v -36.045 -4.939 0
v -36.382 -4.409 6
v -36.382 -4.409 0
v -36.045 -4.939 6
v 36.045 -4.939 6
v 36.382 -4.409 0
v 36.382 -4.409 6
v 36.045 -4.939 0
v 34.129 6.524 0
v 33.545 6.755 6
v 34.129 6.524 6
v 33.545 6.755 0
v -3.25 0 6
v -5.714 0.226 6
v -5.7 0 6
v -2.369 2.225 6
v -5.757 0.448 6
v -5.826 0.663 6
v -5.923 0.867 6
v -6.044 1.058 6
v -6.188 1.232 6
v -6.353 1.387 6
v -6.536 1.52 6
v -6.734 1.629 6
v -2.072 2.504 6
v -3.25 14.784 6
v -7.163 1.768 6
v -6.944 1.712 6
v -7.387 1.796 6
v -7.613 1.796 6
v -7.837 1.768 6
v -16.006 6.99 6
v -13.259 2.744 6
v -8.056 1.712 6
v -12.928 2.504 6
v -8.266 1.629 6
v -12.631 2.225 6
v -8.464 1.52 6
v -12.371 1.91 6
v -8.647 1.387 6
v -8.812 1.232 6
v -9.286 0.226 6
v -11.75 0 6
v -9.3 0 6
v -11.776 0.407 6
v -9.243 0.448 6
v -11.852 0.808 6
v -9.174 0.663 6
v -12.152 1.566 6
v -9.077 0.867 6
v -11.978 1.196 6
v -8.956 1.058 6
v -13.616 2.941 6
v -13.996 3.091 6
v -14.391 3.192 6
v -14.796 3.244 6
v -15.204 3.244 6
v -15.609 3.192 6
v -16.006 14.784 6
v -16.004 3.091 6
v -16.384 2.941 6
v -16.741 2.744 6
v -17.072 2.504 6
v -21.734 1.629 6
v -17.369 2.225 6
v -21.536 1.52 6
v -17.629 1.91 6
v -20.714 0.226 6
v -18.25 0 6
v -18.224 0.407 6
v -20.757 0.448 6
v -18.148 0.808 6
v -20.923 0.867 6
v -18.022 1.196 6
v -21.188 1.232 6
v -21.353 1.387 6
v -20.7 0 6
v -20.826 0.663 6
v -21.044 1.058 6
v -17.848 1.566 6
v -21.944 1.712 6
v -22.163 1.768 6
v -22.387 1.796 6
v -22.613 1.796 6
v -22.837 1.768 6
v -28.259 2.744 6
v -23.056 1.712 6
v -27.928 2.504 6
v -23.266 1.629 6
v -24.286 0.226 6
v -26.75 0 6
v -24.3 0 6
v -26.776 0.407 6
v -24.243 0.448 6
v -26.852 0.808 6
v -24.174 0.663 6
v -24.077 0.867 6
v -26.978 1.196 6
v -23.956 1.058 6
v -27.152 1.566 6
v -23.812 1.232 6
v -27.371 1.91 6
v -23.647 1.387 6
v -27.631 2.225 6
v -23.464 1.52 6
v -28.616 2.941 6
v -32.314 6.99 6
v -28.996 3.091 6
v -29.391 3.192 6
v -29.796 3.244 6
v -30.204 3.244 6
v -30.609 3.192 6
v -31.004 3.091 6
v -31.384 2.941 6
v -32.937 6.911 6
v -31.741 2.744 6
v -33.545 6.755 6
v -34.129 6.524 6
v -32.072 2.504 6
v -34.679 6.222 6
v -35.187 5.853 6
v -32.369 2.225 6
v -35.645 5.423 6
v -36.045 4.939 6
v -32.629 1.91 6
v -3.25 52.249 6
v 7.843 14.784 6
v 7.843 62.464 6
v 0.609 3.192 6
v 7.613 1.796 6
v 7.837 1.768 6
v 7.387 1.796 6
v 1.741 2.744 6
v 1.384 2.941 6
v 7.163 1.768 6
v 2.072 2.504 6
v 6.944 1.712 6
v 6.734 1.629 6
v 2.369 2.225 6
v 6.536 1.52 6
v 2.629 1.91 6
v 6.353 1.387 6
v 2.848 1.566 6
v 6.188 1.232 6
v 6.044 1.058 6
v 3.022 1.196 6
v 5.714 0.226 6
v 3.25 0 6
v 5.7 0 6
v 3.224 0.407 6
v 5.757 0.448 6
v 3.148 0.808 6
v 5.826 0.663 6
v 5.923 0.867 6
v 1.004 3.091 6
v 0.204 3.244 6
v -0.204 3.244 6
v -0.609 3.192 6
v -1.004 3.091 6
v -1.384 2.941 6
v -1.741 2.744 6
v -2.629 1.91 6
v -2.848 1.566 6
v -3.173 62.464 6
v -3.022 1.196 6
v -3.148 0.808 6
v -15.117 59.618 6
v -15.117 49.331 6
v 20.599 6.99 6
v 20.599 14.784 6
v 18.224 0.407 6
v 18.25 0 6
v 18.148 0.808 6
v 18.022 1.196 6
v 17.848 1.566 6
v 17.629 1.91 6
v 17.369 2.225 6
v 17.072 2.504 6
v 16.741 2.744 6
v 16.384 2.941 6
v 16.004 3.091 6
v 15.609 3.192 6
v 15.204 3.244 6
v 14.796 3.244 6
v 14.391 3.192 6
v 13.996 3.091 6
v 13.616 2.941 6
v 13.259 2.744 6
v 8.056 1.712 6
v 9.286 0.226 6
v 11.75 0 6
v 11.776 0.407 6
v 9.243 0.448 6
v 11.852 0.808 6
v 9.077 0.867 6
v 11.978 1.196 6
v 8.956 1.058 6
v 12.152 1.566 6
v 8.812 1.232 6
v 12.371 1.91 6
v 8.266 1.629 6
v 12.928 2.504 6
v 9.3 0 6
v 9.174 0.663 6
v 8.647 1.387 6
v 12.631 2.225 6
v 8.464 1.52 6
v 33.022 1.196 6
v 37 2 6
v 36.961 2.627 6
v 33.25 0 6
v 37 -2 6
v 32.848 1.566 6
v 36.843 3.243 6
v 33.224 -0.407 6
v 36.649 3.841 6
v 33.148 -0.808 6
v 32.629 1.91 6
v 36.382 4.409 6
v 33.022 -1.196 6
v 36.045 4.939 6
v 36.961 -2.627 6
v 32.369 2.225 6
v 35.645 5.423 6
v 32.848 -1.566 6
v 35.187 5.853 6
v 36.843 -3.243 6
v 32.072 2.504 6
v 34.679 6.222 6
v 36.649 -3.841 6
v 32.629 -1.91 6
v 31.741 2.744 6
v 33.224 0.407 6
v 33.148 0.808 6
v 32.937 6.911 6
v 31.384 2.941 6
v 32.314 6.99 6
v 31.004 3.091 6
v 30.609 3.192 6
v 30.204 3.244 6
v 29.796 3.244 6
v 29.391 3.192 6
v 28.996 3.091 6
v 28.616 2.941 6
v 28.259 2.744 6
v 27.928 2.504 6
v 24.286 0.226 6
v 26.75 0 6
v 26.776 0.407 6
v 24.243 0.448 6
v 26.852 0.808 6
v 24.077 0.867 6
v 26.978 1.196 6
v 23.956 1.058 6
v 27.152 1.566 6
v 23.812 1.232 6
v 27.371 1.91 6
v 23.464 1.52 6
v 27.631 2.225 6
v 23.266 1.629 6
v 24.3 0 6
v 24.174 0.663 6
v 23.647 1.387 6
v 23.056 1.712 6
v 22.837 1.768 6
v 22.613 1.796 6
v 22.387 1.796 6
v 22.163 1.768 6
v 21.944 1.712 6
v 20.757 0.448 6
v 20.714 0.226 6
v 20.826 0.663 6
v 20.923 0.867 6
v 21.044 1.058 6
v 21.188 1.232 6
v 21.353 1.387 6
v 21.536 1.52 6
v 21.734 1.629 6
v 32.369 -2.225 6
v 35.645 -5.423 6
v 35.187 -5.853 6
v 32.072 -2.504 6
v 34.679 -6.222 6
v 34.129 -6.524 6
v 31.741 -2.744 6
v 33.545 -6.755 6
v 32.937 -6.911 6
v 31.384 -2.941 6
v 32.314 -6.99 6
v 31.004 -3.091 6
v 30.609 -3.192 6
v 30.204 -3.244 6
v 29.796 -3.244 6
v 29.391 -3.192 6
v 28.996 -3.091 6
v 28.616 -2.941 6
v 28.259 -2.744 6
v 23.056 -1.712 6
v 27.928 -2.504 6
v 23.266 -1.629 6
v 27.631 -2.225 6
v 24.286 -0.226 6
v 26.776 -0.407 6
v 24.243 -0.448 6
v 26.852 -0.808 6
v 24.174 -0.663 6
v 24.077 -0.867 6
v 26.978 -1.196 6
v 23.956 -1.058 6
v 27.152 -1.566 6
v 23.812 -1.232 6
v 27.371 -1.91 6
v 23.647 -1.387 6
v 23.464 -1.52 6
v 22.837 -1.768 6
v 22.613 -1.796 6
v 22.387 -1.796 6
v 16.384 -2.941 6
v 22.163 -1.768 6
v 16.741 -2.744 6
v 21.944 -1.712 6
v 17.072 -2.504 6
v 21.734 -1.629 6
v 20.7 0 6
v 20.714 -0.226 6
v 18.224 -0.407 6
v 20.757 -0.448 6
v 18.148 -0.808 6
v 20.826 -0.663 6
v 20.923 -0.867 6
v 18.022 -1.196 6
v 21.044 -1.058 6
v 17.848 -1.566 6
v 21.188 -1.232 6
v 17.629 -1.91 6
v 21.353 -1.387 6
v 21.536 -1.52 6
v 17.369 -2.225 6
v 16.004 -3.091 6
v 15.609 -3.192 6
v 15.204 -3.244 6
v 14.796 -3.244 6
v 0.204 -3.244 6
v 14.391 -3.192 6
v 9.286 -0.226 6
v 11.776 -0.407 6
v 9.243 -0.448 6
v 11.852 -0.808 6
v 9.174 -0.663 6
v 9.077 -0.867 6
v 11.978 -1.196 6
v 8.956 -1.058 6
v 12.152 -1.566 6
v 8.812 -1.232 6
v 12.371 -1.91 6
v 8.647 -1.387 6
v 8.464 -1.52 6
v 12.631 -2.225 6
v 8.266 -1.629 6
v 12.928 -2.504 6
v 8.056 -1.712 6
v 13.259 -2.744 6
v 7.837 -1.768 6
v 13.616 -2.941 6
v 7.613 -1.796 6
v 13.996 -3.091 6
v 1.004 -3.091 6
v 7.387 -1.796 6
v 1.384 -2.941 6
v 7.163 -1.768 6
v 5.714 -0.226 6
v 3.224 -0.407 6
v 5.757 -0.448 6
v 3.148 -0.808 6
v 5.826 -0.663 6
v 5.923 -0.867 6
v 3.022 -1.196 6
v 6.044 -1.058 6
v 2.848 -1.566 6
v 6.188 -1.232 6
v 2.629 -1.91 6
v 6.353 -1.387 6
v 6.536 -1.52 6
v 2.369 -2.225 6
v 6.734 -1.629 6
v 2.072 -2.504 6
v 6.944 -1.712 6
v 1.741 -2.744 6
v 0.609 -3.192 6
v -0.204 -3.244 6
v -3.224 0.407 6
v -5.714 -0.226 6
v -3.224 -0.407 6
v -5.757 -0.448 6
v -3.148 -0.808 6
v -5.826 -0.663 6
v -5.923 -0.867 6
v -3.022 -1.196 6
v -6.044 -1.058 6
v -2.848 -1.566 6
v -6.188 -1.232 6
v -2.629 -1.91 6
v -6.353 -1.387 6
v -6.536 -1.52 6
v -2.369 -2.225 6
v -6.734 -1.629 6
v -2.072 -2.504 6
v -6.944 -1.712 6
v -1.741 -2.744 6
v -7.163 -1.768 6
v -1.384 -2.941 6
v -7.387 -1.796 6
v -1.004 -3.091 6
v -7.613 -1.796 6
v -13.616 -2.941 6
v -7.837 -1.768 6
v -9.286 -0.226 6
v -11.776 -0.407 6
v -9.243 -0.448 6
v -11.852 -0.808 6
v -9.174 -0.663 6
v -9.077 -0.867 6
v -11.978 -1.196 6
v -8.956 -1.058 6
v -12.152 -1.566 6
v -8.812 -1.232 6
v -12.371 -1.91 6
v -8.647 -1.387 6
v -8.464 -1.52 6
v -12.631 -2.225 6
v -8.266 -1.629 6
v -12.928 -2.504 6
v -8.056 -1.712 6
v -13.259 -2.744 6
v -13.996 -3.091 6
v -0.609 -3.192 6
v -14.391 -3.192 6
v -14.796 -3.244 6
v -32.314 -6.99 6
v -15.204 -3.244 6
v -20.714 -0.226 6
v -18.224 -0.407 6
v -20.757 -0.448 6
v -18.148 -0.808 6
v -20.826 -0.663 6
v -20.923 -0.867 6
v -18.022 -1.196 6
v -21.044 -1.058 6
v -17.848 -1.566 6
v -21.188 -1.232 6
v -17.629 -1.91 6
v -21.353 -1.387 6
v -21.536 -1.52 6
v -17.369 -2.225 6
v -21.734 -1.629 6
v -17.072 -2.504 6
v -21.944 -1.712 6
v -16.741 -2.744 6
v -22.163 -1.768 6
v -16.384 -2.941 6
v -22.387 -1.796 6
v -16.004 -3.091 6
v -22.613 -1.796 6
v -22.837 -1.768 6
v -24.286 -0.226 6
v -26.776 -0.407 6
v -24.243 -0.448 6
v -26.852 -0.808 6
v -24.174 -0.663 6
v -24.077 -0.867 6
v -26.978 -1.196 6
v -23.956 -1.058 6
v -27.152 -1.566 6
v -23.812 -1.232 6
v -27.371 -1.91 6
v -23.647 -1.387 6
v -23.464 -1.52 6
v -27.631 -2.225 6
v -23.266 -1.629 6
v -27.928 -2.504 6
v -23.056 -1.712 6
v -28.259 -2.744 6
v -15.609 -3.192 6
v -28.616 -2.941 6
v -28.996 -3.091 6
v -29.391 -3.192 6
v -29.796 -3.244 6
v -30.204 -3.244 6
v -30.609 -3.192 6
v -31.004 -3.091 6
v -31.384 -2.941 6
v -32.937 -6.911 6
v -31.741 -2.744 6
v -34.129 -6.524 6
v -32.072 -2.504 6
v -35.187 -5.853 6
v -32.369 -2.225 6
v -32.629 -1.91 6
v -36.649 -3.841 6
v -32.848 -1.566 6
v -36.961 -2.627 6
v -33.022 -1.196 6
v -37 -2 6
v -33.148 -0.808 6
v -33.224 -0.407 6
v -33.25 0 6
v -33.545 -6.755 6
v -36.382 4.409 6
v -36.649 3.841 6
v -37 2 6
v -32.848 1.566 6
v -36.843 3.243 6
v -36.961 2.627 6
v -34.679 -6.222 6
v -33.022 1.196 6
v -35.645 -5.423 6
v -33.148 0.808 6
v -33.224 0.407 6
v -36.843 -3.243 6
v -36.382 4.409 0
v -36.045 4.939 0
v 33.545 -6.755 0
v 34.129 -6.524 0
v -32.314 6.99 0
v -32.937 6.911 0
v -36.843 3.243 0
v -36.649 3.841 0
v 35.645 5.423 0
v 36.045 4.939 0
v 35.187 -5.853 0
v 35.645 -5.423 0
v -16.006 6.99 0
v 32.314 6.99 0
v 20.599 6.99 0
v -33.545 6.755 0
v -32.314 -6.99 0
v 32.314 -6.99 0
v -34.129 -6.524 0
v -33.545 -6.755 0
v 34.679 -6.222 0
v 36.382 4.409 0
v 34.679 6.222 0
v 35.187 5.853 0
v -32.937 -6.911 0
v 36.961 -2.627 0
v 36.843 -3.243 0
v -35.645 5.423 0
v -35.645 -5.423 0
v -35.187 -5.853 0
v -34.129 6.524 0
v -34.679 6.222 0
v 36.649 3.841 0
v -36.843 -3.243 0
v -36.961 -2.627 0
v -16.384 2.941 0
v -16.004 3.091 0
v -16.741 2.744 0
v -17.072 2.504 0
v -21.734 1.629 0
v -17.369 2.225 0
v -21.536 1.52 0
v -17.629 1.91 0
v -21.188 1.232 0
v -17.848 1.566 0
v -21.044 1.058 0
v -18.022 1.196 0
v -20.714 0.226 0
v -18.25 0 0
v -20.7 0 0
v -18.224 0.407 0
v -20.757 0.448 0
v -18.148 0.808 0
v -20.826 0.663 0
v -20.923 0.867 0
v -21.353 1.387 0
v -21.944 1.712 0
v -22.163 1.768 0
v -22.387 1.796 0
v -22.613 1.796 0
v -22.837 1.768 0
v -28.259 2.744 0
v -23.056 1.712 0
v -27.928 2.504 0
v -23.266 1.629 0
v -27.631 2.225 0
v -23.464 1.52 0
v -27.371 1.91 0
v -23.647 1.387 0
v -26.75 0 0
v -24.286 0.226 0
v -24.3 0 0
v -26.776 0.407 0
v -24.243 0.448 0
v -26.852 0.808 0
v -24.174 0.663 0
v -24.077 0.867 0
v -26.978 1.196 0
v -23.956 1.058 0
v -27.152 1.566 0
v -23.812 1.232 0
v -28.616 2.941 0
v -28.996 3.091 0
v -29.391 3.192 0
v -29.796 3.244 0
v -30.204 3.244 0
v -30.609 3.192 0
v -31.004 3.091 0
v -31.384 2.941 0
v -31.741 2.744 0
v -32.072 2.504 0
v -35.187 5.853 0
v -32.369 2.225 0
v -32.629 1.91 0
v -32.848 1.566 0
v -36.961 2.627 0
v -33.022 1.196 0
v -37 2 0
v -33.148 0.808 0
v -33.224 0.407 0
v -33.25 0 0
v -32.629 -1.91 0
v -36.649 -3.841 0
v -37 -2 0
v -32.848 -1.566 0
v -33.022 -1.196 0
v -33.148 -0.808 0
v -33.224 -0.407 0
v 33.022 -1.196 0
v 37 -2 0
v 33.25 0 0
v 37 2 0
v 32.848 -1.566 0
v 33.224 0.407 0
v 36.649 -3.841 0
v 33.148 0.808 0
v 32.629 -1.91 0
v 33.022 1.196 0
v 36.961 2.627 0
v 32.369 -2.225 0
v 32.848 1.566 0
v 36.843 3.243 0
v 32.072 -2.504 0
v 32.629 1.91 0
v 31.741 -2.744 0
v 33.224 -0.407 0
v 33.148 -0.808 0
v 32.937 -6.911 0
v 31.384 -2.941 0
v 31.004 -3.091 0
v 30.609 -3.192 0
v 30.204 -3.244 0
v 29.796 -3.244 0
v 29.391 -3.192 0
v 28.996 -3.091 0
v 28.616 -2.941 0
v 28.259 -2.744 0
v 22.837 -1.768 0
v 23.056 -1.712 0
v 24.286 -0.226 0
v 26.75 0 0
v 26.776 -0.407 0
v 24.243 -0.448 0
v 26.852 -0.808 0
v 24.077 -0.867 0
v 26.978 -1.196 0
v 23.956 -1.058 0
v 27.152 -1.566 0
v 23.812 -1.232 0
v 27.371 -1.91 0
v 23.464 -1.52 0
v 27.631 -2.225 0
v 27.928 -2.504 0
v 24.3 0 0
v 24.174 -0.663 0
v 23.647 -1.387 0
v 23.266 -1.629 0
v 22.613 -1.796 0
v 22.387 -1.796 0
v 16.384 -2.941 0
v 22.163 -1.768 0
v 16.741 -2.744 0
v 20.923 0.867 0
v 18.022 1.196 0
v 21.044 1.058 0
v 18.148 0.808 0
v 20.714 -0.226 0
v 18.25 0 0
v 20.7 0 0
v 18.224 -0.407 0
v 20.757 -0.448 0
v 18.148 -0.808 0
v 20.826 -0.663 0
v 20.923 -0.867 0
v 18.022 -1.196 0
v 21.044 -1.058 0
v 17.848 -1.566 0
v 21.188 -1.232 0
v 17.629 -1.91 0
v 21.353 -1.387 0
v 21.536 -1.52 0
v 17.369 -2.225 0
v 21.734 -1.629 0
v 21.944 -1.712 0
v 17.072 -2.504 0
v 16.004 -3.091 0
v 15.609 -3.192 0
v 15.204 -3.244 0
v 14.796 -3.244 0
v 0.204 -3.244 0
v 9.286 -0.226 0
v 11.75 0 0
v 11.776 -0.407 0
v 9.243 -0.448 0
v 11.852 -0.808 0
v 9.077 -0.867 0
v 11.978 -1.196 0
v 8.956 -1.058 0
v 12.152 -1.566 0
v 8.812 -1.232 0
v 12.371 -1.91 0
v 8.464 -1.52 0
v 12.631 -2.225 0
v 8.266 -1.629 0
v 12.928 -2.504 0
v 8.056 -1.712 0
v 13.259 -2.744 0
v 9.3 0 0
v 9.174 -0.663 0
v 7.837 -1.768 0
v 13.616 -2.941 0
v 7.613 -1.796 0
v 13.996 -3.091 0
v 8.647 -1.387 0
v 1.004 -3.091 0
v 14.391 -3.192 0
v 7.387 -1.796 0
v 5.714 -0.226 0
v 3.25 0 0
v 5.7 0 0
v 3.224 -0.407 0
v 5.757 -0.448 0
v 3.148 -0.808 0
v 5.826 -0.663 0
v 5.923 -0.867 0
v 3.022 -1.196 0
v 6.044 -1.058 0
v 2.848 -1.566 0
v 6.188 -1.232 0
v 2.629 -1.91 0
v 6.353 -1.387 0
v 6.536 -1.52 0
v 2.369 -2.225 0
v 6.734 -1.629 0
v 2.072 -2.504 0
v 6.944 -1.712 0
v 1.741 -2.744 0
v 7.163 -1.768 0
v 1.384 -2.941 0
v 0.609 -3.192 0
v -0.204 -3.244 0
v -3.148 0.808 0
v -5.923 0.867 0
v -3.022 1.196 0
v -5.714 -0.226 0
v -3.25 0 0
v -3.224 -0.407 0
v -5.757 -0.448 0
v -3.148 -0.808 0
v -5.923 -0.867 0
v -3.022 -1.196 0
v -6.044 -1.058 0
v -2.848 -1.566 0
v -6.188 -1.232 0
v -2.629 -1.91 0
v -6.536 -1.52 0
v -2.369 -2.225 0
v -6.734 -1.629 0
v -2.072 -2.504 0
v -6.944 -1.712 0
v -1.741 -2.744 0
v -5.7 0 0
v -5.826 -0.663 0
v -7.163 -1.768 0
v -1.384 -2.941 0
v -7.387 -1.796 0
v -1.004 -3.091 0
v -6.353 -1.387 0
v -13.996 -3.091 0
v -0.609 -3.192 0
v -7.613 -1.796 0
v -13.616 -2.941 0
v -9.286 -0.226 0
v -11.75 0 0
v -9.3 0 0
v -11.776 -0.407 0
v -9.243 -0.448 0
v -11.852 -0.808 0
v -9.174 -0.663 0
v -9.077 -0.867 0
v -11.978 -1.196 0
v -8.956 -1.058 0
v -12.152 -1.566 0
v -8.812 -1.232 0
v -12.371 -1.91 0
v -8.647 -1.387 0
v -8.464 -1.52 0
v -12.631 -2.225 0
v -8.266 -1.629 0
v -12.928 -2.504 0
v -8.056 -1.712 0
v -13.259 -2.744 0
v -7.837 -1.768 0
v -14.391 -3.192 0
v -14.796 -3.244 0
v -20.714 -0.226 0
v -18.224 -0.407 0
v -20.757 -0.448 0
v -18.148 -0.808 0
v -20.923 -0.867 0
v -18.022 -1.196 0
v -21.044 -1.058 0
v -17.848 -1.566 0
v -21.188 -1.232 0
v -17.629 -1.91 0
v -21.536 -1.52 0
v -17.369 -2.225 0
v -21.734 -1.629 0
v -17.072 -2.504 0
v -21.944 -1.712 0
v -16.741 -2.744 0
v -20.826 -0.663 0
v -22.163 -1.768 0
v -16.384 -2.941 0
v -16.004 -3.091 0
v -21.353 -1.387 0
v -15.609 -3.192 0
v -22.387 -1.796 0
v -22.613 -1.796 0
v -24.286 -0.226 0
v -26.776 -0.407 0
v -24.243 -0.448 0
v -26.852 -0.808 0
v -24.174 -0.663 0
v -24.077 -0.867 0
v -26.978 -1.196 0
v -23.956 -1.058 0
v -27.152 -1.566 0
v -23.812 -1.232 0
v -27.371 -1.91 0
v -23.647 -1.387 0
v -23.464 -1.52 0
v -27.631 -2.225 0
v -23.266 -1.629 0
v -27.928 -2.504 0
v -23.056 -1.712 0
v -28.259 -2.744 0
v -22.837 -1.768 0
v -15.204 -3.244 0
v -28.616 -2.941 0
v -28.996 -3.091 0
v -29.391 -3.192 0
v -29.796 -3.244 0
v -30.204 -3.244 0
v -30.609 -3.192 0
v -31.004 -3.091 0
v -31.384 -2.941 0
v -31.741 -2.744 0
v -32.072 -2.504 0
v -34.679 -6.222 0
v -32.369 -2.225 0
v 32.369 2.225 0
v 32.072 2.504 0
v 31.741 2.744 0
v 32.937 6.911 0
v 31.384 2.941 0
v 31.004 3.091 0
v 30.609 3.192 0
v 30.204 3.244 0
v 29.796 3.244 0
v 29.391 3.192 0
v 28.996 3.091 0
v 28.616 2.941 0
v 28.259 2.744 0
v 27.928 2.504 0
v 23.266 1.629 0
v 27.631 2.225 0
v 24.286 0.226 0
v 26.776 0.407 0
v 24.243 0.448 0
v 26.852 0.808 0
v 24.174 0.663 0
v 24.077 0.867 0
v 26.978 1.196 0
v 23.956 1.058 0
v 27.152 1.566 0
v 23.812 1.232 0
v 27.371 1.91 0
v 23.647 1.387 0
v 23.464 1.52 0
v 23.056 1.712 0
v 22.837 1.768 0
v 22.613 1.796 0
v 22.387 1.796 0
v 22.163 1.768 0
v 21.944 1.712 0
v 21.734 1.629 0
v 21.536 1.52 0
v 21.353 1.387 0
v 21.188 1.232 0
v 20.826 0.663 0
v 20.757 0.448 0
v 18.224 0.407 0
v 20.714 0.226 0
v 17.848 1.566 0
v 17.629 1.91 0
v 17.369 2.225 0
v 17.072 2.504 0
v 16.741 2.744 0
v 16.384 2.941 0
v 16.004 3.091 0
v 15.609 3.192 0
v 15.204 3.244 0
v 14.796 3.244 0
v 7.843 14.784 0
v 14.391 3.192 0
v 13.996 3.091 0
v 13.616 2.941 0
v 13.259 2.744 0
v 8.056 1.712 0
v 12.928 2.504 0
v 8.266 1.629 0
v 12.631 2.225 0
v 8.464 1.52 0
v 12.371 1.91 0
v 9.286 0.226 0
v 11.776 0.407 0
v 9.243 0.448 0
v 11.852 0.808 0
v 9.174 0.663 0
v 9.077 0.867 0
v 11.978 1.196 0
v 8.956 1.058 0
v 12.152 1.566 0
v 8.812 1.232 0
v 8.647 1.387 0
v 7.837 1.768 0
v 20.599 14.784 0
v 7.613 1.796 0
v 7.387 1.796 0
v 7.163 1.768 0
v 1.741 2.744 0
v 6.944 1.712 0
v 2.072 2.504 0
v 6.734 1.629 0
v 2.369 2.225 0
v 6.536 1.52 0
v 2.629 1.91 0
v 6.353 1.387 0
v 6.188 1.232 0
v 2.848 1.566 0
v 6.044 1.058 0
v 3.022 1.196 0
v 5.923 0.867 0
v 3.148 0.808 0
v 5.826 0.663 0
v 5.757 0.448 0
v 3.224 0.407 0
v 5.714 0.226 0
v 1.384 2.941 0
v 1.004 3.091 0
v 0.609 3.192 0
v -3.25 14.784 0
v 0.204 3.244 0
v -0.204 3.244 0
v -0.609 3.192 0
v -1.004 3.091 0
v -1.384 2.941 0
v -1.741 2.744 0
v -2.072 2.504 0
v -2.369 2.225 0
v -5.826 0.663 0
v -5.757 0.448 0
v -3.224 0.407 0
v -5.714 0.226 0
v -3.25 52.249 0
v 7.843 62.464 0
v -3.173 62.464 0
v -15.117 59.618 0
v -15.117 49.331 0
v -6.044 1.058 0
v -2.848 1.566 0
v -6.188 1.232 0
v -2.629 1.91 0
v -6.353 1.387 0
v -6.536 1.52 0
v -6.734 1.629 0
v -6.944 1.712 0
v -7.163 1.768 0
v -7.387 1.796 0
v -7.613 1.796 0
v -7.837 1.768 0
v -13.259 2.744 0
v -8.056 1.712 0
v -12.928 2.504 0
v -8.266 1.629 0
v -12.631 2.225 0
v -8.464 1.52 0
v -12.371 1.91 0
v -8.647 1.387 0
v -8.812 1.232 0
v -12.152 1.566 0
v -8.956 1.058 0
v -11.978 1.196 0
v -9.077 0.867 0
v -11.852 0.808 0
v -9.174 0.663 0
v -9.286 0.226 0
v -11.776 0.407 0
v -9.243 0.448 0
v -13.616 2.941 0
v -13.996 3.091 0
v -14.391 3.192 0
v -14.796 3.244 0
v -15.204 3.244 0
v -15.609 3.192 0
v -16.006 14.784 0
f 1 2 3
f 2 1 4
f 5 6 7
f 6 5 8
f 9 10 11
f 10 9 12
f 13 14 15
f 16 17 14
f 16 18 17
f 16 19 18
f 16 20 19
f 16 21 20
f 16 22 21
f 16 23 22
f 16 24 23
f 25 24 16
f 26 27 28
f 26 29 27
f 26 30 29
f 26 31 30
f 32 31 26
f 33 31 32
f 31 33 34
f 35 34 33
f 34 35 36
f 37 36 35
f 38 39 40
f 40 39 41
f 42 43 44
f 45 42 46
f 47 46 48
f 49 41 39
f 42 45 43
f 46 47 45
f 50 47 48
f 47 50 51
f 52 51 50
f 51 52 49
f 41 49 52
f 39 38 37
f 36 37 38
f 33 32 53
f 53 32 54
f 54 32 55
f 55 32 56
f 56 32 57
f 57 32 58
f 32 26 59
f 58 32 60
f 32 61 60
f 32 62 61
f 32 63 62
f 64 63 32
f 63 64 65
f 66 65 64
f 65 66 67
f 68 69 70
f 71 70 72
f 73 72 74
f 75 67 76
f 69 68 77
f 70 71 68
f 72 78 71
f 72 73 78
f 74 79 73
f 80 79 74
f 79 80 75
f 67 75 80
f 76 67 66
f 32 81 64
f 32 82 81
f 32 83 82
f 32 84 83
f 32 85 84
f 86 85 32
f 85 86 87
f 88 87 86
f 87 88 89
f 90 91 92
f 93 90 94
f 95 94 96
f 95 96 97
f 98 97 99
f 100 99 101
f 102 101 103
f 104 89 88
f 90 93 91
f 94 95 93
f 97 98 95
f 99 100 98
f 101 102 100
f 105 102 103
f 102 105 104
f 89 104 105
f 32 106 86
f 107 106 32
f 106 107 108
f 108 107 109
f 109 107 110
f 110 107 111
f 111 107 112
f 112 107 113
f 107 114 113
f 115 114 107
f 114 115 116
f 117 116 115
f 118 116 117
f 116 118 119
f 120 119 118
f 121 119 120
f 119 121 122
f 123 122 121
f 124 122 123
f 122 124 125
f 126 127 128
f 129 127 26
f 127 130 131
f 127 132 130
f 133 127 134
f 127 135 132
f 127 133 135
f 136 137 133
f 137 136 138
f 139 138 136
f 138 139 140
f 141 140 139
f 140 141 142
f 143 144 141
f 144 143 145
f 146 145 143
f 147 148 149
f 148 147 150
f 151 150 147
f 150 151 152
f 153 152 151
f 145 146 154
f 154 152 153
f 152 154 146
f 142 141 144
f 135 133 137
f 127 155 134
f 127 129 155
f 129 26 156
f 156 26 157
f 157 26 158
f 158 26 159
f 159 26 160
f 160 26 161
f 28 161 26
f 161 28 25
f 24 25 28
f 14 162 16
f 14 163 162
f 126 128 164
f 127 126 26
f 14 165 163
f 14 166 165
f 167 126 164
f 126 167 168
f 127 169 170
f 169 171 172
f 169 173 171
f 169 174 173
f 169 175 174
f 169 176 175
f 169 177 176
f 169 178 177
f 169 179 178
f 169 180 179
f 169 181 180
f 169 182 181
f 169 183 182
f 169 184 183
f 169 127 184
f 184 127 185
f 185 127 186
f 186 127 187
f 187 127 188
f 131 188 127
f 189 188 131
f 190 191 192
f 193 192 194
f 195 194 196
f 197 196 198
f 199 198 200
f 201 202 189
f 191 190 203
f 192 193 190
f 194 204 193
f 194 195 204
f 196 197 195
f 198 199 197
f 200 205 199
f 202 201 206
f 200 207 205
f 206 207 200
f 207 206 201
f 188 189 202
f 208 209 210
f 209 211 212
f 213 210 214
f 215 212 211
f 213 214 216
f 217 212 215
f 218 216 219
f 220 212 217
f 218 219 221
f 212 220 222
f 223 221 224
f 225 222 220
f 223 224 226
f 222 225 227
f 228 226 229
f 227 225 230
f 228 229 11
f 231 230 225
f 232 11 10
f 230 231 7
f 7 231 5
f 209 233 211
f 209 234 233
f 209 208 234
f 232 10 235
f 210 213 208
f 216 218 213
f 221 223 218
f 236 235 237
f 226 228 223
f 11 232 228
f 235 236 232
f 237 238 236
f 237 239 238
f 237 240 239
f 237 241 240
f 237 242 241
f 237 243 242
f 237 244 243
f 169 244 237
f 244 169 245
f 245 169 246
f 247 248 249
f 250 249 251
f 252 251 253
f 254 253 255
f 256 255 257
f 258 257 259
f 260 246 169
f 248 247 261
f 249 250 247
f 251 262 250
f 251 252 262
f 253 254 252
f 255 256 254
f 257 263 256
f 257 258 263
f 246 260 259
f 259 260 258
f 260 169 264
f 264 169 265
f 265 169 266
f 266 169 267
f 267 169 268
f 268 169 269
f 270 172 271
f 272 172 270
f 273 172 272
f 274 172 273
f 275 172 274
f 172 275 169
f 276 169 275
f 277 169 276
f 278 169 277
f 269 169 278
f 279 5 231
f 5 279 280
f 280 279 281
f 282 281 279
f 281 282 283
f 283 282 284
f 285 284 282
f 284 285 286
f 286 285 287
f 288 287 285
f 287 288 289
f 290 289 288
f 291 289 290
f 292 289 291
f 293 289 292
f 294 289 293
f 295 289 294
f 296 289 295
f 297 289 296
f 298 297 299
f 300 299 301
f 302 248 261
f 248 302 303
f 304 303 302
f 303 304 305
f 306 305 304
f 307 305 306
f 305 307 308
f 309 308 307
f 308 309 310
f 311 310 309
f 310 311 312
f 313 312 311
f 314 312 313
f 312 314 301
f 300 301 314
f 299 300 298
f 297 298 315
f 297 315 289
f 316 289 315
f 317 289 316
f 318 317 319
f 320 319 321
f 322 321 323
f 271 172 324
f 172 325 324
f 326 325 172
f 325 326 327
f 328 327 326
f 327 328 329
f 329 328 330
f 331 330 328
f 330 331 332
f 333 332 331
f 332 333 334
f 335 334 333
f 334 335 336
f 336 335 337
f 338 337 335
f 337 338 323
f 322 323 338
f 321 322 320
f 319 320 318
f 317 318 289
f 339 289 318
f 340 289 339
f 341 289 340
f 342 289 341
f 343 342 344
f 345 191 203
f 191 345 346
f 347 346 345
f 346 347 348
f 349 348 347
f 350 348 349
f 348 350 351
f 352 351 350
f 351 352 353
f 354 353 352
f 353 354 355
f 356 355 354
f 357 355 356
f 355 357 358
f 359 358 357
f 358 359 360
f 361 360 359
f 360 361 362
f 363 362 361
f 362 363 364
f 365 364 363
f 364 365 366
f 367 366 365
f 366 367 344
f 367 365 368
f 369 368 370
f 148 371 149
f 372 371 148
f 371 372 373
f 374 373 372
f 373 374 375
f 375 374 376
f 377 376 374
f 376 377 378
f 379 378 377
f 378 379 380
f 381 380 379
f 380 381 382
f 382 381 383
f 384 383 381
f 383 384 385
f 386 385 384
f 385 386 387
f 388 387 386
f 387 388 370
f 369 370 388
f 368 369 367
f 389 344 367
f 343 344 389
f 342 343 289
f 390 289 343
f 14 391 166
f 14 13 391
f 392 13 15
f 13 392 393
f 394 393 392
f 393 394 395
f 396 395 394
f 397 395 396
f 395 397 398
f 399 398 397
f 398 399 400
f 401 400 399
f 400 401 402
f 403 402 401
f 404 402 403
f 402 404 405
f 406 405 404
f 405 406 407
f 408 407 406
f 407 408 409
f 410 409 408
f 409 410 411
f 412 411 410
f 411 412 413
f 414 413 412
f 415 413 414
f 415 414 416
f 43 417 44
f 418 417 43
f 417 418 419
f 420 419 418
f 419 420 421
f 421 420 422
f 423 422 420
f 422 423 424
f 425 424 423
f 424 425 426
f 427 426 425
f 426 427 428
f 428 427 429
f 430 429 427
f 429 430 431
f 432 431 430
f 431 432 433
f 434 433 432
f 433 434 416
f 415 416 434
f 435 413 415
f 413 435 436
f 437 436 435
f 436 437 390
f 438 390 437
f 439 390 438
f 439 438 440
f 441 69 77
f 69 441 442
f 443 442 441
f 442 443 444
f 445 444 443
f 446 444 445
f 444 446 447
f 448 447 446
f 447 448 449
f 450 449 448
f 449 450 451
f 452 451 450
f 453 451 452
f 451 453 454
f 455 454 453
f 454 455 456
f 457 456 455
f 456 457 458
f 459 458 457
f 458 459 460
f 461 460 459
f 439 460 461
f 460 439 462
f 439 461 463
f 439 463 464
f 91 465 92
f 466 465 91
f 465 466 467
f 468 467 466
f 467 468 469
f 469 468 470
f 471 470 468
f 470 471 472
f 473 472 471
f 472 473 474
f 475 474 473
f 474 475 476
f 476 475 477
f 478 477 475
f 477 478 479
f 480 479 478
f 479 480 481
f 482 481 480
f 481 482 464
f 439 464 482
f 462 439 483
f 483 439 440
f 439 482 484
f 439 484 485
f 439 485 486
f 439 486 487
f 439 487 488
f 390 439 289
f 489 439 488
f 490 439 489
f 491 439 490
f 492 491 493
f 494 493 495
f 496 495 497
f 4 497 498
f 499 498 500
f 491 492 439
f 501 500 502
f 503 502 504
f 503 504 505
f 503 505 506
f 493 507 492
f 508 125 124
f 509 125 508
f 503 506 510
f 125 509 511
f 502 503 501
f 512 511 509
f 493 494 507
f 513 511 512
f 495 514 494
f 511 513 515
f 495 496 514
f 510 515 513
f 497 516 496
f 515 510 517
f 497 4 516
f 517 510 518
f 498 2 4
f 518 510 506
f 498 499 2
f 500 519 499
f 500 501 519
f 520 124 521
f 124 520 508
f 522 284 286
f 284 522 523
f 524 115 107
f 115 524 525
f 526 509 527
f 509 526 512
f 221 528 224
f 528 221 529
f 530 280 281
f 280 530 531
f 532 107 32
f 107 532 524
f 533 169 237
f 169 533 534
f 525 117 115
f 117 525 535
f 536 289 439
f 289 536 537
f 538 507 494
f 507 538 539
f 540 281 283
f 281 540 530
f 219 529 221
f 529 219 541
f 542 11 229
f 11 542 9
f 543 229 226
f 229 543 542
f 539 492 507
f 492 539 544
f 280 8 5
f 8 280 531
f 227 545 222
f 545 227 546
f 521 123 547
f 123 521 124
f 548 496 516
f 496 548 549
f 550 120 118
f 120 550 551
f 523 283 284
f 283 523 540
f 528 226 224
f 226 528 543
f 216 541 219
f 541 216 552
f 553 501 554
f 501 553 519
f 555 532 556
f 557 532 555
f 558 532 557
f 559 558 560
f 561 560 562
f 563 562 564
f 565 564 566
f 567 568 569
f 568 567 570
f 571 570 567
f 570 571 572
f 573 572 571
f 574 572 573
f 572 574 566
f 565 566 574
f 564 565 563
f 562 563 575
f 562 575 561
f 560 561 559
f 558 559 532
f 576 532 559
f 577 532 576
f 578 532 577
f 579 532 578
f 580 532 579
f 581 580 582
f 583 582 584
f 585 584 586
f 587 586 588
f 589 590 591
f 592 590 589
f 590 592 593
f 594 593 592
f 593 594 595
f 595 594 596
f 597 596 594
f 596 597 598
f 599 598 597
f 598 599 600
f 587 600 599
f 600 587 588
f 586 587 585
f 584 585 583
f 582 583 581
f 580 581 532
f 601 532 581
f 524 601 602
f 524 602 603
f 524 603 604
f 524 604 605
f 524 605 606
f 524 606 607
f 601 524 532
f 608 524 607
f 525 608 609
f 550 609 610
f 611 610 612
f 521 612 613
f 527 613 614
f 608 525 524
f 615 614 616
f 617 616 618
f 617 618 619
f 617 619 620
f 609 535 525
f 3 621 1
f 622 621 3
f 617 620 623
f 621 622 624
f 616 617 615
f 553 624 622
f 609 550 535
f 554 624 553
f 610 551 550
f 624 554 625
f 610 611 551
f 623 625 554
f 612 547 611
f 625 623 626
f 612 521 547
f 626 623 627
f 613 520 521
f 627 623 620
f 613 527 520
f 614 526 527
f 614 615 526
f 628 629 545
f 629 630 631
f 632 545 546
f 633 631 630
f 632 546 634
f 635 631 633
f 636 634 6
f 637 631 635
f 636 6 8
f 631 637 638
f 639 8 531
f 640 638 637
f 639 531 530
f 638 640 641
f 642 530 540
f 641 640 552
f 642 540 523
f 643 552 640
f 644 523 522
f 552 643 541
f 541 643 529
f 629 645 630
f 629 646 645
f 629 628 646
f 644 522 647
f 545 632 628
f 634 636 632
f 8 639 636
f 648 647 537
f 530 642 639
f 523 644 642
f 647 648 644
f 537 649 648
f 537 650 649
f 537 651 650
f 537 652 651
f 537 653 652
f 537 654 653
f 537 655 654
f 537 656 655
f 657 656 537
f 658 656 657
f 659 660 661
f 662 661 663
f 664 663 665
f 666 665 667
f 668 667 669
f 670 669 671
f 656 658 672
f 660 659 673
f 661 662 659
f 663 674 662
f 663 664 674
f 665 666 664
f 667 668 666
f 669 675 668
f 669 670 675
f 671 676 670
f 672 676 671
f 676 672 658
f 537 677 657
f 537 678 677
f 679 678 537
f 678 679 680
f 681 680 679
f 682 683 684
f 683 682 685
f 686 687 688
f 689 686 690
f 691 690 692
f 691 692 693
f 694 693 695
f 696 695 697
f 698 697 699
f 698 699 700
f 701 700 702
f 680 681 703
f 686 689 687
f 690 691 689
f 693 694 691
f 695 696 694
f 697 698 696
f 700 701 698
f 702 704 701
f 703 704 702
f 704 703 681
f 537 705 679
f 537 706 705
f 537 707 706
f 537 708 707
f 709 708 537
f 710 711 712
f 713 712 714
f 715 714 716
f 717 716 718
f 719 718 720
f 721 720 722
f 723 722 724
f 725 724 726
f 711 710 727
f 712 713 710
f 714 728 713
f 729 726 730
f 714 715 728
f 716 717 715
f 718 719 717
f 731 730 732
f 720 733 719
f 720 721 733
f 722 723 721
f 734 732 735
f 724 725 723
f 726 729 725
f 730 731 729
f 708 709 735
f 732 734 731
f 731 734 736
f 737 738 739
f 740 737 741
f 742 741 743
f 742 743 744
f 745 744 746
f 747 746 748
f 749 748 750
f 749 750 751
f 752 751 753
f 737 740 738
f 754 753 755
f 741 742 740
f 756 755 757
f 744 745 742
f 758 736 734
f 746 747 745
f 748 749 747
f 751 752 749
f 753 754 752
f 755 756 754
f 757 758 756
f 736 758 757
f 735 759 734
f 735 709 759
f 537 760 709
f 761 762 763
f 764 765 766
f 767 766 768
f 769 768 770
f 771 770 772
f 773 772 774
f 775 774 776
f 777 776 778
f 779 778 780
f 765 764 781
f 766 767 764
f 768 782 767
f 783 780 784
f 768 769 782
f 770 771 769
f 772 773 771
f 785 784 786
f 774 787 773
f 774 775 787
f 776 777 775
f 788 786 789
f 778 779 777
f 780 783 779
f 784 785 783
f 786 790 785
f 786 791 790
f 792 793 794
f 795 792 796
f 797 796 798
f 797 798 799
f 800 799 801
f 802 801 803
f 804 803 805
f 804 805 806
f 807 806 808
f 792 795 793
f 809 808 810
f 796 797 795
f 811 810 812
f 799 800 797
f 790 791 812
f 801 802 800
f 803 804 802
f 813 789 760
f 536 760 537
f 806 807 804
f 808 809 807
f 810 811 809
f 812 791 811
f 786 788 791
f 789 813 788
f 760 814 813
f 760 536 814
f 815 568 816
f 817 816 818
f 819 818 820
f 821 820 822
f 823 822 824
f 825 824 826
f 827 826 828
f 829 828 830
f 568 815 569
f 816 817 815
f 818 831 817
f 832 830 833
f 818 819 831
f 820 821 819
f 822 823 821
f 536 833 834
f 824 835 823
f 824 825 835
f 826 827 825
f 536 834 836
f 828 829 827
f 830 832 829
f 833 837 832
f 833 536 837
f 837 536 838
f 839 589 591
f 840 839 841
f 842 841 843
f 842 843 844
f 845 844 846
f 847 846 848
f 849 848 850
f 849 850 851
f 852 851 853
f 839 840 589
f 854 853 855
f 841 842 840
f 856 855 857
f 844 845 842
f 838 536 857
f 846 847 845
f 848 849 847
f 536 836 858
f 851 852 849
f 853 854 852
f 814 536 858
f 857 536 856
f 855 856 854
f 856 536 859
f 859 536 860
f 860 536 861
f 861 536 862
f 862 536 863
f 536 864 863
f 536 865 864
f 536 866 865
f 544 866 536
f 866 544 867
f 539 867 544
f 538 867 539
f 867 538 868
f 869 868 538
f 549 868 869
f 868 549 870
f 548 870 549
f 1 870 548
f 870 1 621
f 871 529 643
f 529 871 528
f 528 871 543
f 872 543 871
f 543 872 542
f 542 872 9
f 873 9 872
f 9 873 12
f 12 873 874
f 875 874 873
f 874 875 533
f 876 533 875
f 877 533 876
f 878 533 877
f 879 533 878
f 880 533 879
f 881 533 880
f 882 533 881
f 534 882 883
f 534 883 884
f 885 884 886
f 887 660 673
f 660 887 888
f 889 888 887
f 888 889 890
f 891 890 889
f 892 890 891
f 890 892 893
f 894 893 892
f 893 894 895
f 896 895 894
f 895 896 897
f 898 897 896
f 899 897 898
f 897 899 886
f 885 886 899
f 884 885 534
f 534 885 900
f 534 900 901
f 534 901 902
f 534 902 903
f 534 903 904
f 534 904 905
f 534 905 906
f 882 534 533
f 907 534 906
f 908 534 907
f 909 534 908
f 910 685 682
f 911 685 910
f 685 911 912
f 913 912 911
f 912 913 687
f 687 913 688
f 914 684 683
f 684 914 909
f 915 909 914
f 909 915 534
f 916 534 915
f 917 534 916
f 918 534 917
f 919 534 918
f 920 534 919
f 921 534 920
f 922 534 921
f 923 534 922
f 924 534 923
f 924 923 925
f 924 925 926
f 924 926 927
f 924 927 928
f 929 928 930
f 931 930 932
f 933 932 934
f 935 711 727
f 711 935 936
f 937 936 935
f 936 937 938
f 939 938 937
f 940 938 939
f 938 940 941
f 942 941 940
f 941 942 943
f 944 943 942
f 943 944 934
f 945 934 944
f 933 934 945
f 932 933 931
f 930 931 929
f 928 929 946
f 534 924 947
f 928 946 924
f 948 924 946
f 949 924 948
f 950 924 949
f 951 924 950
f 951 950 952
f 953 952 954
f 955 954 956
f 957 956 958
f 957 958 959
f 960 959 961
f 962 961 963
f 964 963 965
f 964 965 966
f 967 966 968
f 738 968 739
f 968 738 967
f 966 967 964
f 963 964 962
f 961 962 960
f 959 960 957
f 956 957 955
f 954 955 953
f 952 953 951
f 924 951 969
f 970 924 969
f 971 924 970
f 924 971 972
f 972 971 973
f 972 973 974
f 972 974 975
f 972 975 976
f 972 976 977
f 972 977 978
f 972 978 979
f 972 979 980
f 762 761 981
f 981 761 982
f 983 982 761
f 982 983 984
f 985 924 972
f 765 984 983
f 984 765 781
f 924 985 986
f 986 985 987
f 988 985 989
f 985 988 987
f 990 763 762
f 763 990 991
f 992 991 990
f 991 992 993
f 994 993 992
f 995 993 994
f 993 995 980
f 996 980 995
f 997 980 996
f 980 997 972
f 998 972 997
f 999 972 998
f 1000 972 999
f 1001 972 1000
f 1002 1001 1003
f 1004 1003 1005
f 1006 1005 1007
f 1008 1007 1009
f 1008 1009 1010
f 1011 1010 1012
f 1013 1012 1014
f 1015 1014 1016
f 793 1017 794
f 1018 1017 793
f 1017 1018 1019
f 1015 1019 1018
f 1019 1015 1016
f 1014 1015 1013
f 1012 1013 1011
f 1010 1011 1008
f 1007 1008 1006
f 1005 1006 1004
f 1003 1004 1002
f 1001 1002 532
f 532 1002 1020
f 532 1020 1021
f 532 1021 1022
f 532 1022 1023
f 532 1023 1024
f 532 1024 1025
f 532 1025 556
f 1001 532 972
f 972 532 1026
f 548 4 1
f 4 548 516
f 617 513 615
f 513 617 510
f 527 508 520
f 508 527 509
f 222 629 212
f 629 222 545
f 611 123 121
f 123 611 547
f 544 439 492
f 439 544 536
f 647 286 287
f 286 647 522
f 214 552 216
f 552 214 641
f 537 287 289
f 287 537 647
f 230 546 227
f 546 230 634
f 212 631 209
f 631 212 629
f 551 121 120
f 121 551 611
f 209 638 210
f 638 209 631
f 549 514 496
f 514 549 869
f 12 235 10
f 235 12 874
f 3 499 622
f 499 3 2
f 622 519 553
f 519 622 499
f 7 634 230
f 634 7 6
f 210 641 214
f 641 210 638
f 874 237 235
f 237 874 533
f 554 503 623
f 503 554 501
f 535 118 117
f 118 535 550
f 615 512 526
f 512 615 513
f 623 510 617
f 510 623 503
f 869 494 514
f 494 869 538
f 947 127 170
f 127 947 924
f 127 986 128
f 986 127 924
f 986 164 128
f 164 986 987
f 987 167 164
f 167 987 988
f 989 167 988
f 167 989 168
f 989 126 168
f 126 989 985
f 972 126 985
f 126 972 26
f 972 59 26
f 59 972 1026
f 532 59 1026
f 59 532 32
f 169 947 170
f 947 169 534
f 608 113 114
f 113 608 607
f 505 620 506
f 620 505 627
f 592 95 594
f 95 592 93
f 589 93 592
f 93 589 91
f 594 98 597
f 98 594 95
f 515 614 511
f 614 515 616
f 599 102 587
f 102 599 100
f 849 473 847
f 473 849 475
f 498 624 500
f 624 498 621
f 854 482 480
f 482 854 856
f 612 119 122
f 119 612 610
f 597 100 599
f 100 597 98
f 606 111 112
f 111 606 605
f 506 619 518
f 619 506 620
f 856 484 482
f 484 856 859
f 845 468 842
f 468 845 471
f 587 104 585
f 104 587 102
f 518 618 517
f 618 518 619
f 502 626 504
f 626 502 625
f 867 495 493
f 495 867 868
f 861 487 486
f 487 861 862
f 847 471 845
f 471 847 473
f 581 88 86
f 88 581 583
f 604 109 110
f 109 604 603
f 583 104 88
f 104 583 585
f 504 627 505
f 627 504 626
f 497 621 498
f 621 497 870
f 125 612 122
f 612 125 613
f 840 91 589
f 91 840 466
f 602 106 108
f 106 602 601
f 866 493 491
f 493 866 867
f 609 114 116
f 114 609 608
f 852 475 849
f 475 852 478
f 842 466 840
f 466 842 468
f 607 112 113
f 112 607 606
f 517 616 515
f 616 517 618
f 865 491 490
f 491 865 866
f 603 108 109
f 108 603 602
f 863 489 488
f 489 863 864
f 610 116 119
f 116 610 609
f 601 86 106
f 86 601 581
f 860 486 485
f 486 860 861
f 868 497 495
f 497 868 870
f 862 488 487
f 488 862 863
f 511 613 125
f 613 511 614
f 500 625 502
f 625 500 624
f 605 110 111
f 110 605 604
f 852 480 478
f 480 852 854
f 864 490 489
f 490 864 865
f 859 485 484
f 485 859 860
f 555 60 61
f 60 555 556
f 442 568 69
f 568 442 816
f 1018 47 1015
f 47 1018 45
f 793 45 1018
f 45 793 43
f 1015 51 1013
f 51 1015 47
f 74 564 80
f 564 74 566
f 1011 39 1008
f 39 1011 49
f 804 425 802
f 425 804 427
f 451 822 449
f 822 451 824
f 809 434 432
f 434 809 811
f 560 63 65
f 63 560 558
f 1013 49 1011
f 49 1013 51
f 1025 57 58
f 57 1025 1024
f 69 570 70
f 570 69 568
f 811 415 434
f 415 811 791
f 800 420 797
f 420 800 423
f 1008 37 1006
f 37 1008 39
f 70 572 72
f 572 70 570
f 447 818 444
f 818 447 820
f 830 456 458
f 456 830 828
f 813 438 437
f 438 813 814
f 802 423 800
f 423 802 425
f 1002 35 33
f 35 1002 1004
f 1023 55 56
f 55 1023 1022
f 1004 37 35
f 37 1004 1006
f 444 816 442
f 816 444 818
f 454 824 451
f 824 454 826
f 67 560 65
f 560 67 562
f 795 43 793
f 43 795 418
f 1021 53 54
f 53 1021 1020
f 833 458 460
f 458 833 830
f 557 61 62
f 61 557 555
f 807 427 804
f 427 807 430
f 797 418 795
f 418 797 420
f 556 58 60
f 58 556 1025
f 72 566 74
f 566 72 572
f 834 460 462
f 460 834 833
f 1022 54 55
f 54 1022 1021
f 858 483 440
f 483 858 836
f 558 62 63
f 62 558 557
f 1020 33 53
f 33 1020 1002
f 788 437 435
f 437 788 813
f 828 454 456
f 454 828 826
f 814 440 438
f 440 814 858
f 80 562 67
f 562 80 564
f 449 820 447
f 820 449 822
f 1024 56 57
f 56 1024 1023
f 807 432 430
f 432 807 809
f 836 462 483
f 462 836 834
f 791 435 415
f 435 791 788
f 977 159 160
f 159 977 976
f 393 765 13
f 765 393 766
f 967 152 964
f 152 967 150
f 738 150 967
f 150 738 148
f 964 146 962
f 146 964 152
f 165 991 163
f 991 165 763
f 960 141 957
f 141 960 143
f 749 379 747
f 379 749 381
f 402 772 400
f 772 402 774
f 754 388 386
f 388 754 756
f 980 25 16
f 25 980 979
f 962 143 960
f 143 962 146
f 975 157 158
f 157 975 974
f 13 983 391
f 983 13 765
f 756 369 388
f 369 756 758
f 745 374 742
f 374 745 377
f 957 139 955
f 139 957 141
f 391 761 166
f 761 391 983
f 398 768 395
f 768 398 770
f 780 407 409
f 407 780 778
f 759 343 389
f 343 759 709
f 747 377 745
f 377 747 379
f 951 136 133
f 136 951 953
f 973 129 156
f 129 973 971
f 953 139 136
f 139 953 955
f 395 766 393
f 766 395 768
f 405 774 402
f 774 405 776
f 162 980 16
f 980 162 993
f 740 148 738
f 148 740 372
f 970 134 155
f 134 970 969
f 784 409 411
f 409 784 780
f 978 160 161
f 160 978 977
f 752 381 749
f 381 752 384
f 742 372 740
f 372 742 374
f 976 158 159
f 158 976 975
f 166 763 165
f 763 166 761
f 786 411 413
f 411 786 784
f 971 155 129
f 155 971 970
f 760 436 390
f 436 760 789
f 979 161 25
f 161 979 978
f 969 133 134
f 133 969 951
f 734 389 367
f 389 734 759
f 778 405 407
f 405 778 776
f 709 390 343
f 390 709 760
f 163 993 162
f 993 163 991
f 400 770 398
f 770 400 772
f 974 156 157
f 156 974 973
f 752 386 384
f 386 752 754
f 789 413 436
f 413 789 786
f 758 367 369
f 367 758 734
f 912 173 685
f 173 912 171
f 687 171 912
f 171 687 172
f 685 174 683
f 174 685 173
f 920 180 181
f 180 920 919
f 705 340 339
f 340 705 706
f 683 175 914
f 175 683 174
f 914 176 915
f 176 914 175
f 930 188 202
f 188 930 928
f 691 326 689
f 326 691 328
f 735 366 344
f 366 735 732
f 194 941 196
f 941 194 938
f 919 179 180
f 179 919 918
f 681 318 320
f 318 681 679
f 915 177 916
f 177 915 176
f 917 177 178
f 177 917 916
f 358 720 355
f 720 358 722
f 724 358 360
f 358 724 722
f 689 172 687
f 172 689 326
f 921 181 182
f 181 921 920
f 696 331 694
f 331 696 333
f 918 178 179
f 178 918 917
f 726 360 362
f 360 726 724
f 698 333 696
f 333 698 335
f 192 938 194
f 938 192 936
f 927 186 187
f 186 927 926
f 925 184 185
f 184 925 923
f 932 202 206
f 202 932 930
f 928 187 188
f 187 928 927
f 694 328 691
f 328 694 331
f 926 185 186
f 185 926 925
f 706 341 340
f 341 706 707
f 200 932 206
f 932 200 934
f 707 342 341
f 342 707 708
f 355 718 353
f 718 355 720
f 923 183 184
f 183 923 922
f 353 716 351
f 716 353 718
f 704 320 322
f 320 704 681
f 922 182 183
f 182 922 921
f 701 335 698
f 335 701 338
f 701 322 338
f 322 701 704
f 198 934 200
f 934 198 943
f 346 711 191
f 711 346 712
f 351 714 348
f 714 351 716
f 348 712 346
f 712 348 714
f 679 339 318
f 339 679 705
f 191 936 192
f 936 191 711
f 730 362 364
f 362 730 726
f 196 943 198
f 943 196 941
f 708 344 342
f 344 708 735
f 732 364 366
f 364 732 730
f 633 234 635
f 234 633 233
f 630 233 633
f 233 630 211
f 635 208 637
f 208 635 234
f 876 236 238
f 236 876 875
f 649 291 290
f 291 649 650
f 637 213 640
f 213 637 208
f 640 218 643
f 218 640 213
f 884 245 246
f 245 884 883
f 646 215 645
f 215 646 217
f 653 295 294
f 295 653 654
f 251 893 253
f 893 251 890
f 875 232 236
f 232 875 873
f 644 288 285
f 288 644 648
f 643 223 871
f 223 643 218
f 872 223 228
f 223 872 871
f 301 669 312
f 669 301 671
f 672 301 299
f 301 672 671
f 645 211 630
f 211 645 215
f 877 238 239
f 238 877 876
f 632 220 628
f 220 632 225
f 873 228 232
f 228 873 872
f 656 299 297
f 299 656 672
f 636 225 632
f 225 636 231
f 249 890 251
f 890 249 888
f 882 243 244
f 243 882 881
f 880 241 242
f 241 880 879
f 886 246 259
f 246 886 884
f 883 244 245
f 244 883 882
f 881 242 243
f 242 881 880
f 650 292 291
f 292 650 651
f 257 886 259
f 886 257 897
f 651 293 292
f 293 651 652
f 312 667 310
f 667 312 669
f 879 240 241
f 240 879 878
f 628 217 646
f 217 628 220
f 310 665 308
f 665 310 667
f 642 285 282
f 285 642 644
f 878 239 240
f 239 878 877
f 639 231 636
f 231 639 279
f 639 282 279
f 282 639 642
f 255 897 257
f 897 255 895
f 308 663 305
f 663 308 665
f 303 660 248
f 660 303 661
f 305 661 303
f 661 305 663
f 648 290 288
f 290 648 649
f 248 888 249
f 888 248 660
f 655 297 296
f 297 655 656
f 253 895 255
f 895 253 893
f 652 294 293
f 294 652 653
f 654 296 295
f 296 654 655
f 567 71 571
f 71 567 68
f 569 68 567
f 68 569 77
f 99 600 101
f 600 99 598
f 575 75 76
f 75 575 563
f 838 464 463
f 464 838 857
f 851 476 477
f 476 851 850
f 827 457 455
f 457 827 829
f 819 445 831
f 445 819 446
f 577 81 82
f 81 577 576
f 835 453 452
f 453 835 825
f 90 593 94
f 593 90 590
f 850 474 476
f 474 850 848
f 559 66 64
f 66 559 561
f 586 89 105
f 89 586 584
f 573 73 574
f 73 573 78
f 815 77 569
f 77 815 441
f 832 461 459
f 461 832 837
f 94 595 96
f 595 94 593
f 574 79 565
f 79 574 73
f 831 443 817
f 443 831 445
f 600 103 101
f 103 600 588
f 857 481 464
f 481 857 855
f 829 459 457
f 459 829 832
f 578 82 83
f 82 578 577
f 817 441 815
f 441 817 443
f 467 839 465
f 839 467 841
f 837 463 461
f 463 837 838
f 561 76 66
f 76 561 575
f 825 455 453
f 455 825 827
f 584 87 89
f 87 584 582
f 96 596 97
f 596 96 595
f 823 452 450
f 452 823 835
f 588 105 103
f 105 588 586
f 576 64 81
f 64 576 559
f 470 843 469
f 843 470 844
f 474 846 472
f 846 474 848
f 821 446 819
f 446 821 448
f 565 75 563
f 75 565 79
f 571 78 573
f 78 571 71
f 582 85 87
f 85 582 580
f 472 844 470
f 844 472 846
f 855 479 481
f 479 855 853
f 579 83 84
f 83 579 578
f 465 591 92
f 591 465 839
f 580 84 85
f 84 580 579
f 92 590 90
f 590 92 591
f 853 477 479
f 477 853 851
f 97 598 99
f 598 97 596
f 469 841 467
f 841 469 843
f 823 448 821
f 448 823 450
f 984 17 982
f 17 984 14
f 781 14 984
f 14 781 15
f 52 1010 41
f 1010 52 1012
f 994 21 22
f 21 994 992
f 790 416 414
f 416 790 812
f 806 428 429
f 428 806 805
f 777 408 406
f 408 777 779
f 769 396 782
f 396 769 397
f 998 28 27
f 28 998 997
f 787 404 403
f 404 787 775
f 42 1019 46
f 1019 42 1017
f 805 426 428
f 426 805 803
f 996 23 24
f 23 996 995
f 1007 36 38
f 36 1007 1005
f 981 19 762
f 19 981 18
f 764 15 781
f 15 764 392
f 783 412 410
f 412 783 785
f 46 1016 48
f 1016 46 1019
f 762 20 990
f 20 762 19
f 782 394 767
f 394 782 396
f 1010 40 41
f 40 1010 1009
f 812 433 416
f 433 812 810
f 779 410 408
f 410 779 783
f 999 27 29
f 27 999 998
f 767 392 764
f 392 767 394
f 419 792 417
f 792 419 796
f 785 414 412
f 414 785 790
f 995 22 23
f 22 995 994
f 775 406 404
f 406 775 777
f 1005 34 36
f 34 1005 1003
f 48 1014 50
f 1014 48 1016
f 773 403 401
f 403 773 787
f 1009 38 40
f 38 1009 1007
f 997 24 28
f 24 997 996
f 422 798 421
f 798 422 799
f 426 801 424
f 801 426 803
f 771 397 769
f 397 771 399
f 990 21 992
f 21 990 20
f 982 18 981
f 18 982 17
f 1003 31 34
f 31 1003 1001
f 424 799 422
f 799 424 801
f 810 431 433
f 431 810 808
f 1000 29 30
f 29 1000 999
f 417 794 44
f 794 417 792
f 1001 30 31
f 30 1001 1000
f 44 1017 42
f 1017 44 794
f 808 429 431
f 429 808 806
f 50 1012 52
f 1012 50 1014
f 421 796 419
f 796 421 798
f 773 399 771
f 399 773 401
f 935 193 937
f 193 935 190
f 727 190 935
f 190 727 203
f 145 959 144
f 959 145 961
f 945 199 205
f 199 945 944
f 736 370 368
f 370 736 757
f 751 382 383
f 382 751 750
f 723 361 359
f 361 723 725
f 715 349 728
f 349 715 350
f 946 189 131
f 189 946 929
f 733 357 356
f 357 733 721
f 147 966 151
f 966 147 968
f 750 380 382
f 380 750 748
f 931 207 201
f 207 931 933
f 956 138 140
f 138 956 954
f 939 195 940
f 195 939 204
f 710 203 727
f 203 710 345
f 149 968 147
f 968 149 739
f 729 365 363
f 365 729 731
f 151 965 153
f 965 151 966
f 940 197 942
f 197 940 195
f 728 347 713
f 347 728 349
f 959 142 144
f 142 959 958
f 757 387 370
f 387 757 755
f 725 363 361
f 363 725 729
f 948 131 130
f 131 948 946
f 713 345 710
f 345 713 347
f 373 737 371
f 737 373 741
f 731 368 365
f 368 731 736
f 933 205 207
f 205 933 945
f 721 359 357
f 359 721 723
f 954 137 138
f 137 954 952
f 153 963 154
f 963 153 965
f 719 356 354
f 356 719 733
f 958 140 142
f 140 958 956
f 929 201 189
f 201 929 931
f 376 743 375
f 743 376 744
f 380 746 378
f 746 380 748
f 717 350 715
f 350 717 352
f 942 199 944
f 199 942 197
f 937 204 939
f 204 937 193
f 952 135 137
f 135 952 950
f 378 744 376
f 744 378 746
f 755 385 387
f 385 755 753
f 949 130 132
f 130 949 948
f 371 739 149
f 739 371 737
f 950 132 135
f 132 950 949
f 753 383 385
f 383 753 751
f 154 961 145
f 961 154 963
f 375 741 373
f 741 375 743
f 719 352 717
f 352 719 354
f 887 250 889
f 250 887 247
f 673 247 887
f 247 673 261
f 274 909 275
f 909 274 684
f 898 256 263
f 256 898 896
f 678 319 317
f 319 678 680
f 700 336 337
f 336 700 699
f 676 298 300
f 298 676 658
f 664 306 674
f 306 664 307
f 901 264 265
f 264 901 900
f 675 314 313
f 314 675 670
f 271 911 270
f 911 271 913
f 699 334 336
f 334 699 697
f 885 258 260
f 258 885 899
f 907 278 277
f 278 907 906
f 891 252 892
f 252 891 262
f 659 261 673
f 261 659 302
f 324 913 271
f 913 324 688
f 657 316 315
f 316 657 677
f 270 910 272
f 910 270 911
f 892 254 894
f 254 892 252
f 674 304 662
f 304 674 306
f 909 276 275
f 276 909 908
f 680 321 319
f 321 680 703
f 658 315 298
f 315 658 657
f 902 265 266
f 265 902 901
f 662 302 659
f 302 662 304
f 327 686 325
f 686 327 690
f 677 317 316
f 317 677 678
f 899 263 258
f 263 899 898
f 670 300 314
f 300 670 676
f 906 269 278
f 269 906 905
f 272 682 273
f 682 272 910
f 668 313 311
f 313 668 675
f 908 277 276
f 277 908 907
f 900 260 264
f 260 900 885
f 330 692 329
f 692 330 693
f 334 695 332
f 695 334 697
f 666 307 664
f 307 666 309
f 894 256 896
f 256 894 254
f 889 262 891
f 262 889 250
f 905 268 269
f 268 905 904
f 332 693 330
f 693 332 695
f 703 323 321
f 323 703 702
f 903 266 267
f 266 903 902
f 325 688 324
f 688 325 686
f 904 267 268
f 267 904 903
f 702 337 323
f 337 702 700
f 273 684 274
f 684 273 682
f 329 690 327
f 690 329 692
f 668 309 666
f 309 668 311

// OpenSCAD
$fn = 50;


difference() {
	union() {
		hull() {
			translate(v = [-32.0000000000, 2.0000000000, 0]) {
				cylinder(h = 6, r = 5);
			}
			translate(v = [32.0000000000, 2.0000000000, 0]) {
				cylinder(h = 6, r = 5);
			}
			translate(v = [-32.0000000000, -2.0000000000, 0]) {
				cylinder(h = 6, r = 5);
			}
			translate(v = [32.0000000000, -2.0000000000, 0]) {
				cylinder(h = 6, r = 5);
			}
		}
		translate(v = [0, 61.1111111111, 0]) {
			linear_extrude(height = 6) {
				text(font = "DejaVu Sans Mono:style=Bold", halign = "center", size = 57.0000000000, text = "1", valign = "top");
			}
		}
	}
	union() {
		translate(v = [-30.0000000000, 0.0000000000, 0]) {
			translate(v = [0, 0, -100]) {
				cylinder(h = 200, r = 3.2500000000);
			}
		}
		translate(v = [-15.0000000000, 0.0000000000, 0]) {
			translate(v = [0, 0, -100]) {
				cylinder(h = 200, r = 3.2500000000);
			}
		}
		translate(v = [0, 0, -100]) {
			cylinder(h = 200, r = 3.2500000000);
		}
		translate(v = [15.0000000000, 0.0000000000, 0]) {
			translate(v = [0, 0, -100]) {
				cylinder(h = 200, r = 3.2500000000);
			}
		}
		translate(v = [30.0000000000, 0.0000000000, 0]) {
			translate(v = [0, 0, -100]) {
				cylinder(h = 200, r = 3.2500000000);
			}
		}
		translate(v = [-30.0000000000, 0.0000000000, 0]) {
			translate(v = [0, 0, -100]) {
				cylinder(h = 200, r = 1.8000000000);
			}
		}
		translate(v = [-22.5000000000, 0.0000000000, 0]) {
			translate(v = [0, 0, -100]) {
				cylinder(h = 200, r = 1.8000000000);
			}
		}
		translate(v = [-15.0000000000, 0.0000000000, 0]) {
			translate(v = [0, 0, -100]) {
				cylinder(h = 200, r = 1.8000000000);
			}
		}
		translate(v = [-7.5000000000, 0.0000000000, 0]) {
			translate(v = [0, 0, -100]) {
				cylinder(h = 200, r = 1.8000000000);
			}
		}
		translate(v = [0, 0, -100]) {
			cylinder(h = 200, r = 1.8000000000);
		}
		translate(v = [7.5000000000, 0.0000000000, 0]) {
			translate(v = [0, 0, -100]) {
				cylinder(h = 200, r = 1.8000000000);
			}
		}
		translate(v = [15.0000000000, 0.0000000000, 0]) {
			translate(v = [0, 0, -100]) {
				cylinder(h = 200, r = 1.8000000000);
			}
		}
		translate(v = [22.5000000000, 0.0000000000, 0]) {
			translate(v = [0, 0, -100]) {
				cylinder(h = 200, r = 1.8000000000);
			}
		}
		translate(v = [30.0000000000, 0.0000000000, 0]) {
			translate(v = [0, 0, -100]) {
				cylinder(h = 200, r = 1.8000000000);
			}
		}
	}
}
